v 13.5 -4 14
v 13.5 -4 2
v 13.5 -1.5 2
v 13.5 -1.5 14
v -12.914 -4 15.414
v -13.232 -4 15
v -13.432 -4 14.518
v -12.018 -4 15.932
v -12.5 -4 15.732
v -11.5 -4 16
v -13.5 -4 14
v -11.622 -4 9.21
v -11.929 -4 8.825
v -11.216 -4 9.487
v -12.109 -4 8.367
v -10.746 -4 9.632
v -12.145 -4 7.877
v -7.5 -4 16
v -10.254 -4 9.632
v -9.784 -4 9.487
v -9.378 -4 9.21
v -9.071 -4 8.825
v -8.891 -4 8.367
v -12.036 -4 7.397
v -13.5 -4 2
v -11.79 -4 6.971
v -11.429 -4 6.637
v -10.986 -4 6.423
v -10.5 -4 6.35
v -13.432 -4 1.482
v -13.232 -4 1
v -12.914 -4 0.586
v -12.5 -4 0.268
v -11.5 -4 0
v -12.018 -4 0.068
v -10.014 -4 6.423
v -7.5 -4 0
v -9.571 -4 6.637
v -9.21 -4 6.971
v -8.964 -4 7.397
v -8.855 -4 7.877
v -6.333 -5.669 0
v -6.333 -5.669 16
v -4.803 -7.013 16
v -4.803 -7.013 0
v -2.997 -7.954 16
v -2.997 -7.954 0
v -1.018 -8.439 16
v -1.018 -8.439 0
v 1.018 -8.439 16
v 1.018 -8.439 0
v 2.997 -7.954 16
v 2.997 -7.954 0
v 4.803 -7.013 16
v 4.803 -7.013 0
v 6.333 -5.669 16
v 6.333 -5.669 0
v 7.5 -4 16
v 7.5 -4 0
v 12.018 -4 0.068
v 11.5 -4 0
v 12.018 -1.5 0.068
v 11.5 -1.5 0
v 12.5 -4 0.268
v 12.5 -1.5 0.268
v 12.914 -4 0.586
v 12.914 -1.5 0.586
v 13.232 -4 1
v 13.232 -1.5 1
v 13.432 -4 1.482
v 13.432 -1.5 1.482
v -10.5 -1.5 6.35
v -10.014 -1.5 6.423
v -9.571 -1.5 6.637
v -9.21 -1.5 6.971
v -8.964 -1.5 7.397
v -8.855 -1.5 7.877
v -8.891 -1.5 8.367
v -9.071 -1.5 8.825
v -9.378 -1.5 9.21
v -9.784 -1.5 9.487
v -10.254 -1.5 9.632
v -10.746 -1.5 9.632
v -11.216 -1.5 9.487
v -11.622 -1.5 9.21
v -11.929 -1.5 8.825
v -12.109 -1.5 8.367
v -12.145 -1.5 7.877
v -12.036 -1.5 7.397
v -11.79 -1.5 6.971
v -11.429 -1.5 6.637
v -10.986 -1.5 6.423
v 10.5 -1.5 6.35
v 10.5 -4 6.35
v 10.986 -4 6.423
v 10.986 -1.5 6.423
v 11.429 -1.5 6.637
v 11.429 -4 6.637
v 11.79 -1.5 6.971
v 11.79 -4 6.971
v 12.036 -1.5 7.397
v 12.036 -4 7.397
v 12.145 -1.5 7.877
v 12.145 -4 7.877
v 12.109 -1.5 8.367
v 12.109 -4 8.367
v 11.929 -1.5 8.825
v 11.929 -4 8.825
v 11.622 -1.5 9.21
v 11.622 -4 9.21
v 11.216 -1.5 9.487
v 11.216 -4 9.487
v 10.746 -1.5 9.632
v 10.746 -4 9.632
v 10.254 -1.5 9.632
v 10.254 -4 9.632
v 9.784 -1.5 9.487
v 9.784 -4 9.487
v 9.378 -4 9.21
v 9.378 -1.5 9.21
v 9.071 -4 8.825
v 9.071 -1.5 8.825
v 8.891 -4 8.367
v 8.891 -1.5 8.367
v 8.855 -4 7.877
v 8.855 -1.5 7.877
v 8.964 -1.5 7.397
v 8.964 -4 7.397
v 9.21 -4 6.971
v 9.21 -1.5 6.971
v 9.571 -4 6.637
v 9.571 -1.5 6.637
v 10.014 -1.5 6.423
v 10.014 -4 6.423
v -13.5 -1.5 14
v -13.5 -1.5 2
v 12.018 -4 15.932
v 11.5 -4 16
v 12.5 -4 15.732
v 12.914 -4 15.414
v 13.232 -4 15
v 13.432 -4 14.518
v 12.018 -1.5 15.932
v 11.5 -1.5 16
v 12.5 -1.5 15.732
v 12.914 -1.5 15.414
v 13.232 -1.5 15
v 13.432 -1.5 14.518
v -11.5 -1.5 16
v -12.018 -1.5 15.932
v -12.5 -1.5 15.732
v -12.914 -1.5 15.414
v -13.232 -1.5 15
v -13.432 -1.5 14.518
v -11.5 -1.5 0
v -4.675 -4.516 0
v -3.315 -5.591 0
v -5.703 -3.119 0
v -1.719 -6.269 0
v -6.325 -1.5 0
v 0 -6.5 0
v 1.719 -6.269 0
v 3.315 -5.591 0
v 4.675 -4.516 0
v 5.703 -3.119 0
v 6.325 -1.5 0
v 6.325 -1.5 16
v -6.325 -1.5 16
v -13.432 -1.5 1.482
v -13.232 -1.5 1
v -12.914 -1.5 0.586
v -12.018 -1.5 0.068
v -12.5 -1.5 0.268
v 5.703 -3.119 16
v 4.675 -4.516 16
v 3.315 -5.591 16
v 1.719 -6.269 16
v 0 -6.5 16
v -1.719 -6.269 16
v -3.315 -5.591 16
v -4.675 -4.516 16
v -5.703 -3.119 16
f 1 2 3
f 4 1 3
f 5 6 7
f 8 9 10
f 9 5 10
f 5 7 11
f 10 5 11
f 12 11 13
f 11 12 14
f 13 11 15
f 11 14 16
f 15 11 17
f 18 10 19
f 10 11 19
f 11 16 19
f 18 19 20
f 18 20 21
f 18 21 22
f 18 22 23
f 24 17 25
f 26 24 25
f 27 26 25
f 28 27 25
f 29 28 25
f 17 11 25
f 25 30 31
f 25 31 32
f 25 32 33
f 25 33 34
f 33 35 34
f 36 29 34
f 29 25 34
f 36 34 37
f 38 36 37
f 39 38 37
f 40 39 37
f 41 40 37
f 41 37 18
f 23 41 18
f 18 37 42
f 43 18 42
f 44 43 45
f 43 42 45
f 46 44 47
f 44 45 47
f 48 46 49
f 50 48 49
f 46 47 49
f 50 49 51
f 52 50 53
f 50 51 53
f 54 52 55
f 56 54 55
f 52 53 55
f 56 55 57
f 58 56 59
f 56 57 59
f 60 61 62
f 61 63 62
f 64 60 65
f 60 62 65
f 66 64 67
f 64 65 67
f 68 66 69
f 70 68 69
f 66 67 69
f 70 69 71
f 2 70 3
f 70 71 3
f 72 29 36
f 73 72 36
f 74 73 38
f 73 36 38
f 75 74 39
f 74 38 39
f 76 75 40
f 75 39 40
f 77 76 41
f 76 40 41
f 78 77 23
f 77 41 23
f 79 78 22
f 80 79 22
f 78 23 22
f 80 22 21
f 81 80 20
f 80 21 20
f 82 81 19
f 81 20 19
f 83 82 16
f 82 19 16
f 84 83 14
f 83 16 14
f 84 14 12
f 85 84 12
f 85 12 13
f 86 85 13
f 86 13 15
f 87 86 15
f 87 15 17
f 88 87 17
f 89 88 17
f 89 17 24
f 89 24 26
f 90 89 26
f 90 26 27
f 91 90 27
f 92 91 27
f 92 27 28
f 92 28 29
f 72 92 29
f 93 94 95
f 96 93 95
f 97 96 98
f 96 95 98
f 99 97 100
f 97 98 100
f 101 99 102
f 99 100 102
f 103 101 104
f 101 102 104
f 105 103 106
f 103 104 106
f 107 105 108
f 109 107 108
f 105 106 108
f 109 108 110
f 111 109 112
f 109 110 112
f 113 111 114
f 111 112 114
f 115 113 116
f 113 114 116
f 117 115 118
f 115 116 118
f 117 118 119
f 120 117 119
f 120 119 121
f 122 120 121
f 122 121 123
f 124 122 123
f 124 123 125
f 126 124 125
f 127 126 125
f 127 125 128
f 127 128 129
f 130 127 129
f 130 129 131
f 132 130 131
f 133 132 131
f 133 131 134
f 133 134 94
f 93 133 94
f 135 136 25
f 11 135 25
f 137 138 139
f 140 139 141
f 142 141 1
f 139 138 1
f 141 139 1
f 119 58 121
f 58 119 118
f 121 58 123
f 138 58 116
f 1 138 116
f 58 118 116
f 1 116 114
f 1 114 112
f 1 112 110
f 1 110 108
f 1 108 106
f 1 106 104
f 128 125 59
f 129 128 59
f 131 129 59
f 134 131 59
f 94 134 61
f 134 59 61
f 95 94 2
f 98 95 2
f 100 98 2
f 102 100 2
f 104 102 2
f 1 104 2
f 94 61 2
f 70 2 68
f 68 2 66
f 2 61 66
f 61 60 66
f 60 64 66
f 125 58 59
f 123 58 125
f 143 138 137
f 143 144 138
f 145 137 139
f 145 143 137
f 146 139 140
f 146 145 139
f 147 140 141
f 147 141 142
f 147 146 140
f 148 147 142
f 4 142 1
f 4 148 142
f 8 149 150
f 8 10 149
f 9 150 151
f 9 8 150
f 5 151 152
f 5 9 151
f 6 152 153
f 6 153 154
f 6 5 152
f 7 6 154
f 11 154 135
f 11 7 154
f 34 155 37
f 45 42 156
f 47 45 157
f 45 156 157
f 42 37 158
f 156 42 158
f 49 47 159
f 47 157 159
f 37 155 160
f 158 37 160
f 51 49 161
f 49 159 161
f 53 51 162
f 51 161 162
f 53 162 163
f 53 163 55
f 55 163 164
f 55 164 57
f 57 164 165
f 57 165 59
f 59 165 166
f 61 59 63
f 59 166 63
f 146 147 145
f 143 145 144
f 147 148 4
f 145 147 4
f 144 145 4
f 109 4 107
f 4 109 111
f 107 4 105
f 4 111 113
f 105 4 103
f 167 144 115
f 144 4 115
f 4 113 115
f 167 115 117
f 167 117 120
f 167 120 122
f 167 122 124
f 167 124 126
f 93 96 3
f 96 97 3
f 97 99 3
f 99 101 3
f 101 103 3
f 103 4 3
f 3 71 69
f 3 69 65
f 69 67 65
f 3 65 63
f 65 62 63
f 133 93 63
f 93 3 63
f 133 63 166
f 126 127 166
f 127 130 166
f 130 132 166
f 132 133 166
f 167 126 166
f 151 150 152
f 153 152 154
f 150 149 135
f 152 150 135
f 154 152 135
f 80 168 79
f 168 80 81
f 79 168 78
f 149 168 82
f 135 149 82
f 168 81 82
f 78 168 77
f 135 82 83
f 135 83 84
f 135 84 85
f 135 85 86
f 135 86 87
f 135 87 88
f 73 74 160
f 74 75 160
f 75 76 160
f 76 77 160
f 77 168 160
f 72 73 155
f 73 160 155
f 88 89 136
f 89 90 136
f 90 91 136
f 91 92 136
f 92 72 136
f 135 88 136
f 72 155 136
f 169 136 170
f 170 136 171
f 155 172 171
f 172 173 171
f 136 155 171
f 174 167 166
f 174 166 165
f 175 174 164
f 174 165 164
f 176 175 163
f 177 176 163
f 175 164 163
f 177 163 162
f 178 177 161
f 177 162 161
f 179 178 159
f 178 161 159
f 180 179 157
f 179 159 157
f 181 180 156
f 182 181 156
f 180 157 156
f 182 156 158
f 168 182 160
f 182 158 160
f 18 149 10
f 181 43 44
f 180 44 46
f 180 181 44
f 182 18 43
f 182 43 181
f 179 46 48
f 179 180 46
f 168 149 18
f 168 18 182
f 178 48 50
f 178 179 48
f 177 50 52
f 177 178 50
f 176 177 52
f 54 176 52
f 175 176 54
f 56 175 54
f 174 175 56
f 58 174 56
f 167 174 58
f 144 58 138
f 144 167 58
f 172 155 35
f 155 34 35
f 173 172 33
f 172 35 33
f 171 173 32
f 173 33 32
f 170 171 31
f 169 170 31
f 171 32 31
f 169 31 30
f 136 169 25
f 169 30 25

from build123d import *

# Parameters (mm, degrees)
EXTRUDE_1_DEPTH     = 16
SKETCH_2_R          = 1.65
CUT_EXTRUDE_1_DEPTH = 22.412613105
FILLET_1_R          = 2


with BuildPart() as part:
    # 草图1 → 凸台-拉伸1 (new body)
    with BuildSketch(Plane.XY):
        with BuildLine():
            Line((-6.32455532, -1.5), (-13.5, -1.5))
            Line((-13.5, -1.5), (-13.5, -4))
            Line((-13.5, -4), (-7.5, -4))
            ThreePointArc((-7.5, -4), (0, -8.5), (7.5, -4))
            Line((7.5, -4), (13.5, -4))
            Line((13.5, -4), (13.5, -1.5))
            Line((13.5, -1.5), (6.32455532, -1.5))
            ThreePointArc((6.32455532, -1.5), (0, -6.5), (-6.32455532, -1.5))
        make_face()
    extrude(amount=EXTRUDE_1_DEPTH)

    # 草图2 → 切除-拉伸1 (cut, through all)
    with BuildSketch(Plane.XZ.offset(4)):
        with Locations(Location((-10.5, 8, 0), (0, 0, 270))):
            Circle(SKETCH_2_R)
        with Locations(Location((10.5, 8, 0), (0, 0, 270))):
            Circle(SKETCH_2_R)
    extrude(amount=-CUT_EXTRUDE_1_DEPTH, mode=Mode.SUBTRACT)

    # 圆角1
    fillet_1_edges = [part.edges().sort_by_distance(p)[0] for p in [
        (-13.5, -2.75, 16),
        (13.5, -2.75, 16),
        (13.5, -2.75, 0),
        (-13.5, -2.75, 0),
    ]]
    fillet(fillet_1_edges, radius=FILLET_1_R)


solid = part.part
